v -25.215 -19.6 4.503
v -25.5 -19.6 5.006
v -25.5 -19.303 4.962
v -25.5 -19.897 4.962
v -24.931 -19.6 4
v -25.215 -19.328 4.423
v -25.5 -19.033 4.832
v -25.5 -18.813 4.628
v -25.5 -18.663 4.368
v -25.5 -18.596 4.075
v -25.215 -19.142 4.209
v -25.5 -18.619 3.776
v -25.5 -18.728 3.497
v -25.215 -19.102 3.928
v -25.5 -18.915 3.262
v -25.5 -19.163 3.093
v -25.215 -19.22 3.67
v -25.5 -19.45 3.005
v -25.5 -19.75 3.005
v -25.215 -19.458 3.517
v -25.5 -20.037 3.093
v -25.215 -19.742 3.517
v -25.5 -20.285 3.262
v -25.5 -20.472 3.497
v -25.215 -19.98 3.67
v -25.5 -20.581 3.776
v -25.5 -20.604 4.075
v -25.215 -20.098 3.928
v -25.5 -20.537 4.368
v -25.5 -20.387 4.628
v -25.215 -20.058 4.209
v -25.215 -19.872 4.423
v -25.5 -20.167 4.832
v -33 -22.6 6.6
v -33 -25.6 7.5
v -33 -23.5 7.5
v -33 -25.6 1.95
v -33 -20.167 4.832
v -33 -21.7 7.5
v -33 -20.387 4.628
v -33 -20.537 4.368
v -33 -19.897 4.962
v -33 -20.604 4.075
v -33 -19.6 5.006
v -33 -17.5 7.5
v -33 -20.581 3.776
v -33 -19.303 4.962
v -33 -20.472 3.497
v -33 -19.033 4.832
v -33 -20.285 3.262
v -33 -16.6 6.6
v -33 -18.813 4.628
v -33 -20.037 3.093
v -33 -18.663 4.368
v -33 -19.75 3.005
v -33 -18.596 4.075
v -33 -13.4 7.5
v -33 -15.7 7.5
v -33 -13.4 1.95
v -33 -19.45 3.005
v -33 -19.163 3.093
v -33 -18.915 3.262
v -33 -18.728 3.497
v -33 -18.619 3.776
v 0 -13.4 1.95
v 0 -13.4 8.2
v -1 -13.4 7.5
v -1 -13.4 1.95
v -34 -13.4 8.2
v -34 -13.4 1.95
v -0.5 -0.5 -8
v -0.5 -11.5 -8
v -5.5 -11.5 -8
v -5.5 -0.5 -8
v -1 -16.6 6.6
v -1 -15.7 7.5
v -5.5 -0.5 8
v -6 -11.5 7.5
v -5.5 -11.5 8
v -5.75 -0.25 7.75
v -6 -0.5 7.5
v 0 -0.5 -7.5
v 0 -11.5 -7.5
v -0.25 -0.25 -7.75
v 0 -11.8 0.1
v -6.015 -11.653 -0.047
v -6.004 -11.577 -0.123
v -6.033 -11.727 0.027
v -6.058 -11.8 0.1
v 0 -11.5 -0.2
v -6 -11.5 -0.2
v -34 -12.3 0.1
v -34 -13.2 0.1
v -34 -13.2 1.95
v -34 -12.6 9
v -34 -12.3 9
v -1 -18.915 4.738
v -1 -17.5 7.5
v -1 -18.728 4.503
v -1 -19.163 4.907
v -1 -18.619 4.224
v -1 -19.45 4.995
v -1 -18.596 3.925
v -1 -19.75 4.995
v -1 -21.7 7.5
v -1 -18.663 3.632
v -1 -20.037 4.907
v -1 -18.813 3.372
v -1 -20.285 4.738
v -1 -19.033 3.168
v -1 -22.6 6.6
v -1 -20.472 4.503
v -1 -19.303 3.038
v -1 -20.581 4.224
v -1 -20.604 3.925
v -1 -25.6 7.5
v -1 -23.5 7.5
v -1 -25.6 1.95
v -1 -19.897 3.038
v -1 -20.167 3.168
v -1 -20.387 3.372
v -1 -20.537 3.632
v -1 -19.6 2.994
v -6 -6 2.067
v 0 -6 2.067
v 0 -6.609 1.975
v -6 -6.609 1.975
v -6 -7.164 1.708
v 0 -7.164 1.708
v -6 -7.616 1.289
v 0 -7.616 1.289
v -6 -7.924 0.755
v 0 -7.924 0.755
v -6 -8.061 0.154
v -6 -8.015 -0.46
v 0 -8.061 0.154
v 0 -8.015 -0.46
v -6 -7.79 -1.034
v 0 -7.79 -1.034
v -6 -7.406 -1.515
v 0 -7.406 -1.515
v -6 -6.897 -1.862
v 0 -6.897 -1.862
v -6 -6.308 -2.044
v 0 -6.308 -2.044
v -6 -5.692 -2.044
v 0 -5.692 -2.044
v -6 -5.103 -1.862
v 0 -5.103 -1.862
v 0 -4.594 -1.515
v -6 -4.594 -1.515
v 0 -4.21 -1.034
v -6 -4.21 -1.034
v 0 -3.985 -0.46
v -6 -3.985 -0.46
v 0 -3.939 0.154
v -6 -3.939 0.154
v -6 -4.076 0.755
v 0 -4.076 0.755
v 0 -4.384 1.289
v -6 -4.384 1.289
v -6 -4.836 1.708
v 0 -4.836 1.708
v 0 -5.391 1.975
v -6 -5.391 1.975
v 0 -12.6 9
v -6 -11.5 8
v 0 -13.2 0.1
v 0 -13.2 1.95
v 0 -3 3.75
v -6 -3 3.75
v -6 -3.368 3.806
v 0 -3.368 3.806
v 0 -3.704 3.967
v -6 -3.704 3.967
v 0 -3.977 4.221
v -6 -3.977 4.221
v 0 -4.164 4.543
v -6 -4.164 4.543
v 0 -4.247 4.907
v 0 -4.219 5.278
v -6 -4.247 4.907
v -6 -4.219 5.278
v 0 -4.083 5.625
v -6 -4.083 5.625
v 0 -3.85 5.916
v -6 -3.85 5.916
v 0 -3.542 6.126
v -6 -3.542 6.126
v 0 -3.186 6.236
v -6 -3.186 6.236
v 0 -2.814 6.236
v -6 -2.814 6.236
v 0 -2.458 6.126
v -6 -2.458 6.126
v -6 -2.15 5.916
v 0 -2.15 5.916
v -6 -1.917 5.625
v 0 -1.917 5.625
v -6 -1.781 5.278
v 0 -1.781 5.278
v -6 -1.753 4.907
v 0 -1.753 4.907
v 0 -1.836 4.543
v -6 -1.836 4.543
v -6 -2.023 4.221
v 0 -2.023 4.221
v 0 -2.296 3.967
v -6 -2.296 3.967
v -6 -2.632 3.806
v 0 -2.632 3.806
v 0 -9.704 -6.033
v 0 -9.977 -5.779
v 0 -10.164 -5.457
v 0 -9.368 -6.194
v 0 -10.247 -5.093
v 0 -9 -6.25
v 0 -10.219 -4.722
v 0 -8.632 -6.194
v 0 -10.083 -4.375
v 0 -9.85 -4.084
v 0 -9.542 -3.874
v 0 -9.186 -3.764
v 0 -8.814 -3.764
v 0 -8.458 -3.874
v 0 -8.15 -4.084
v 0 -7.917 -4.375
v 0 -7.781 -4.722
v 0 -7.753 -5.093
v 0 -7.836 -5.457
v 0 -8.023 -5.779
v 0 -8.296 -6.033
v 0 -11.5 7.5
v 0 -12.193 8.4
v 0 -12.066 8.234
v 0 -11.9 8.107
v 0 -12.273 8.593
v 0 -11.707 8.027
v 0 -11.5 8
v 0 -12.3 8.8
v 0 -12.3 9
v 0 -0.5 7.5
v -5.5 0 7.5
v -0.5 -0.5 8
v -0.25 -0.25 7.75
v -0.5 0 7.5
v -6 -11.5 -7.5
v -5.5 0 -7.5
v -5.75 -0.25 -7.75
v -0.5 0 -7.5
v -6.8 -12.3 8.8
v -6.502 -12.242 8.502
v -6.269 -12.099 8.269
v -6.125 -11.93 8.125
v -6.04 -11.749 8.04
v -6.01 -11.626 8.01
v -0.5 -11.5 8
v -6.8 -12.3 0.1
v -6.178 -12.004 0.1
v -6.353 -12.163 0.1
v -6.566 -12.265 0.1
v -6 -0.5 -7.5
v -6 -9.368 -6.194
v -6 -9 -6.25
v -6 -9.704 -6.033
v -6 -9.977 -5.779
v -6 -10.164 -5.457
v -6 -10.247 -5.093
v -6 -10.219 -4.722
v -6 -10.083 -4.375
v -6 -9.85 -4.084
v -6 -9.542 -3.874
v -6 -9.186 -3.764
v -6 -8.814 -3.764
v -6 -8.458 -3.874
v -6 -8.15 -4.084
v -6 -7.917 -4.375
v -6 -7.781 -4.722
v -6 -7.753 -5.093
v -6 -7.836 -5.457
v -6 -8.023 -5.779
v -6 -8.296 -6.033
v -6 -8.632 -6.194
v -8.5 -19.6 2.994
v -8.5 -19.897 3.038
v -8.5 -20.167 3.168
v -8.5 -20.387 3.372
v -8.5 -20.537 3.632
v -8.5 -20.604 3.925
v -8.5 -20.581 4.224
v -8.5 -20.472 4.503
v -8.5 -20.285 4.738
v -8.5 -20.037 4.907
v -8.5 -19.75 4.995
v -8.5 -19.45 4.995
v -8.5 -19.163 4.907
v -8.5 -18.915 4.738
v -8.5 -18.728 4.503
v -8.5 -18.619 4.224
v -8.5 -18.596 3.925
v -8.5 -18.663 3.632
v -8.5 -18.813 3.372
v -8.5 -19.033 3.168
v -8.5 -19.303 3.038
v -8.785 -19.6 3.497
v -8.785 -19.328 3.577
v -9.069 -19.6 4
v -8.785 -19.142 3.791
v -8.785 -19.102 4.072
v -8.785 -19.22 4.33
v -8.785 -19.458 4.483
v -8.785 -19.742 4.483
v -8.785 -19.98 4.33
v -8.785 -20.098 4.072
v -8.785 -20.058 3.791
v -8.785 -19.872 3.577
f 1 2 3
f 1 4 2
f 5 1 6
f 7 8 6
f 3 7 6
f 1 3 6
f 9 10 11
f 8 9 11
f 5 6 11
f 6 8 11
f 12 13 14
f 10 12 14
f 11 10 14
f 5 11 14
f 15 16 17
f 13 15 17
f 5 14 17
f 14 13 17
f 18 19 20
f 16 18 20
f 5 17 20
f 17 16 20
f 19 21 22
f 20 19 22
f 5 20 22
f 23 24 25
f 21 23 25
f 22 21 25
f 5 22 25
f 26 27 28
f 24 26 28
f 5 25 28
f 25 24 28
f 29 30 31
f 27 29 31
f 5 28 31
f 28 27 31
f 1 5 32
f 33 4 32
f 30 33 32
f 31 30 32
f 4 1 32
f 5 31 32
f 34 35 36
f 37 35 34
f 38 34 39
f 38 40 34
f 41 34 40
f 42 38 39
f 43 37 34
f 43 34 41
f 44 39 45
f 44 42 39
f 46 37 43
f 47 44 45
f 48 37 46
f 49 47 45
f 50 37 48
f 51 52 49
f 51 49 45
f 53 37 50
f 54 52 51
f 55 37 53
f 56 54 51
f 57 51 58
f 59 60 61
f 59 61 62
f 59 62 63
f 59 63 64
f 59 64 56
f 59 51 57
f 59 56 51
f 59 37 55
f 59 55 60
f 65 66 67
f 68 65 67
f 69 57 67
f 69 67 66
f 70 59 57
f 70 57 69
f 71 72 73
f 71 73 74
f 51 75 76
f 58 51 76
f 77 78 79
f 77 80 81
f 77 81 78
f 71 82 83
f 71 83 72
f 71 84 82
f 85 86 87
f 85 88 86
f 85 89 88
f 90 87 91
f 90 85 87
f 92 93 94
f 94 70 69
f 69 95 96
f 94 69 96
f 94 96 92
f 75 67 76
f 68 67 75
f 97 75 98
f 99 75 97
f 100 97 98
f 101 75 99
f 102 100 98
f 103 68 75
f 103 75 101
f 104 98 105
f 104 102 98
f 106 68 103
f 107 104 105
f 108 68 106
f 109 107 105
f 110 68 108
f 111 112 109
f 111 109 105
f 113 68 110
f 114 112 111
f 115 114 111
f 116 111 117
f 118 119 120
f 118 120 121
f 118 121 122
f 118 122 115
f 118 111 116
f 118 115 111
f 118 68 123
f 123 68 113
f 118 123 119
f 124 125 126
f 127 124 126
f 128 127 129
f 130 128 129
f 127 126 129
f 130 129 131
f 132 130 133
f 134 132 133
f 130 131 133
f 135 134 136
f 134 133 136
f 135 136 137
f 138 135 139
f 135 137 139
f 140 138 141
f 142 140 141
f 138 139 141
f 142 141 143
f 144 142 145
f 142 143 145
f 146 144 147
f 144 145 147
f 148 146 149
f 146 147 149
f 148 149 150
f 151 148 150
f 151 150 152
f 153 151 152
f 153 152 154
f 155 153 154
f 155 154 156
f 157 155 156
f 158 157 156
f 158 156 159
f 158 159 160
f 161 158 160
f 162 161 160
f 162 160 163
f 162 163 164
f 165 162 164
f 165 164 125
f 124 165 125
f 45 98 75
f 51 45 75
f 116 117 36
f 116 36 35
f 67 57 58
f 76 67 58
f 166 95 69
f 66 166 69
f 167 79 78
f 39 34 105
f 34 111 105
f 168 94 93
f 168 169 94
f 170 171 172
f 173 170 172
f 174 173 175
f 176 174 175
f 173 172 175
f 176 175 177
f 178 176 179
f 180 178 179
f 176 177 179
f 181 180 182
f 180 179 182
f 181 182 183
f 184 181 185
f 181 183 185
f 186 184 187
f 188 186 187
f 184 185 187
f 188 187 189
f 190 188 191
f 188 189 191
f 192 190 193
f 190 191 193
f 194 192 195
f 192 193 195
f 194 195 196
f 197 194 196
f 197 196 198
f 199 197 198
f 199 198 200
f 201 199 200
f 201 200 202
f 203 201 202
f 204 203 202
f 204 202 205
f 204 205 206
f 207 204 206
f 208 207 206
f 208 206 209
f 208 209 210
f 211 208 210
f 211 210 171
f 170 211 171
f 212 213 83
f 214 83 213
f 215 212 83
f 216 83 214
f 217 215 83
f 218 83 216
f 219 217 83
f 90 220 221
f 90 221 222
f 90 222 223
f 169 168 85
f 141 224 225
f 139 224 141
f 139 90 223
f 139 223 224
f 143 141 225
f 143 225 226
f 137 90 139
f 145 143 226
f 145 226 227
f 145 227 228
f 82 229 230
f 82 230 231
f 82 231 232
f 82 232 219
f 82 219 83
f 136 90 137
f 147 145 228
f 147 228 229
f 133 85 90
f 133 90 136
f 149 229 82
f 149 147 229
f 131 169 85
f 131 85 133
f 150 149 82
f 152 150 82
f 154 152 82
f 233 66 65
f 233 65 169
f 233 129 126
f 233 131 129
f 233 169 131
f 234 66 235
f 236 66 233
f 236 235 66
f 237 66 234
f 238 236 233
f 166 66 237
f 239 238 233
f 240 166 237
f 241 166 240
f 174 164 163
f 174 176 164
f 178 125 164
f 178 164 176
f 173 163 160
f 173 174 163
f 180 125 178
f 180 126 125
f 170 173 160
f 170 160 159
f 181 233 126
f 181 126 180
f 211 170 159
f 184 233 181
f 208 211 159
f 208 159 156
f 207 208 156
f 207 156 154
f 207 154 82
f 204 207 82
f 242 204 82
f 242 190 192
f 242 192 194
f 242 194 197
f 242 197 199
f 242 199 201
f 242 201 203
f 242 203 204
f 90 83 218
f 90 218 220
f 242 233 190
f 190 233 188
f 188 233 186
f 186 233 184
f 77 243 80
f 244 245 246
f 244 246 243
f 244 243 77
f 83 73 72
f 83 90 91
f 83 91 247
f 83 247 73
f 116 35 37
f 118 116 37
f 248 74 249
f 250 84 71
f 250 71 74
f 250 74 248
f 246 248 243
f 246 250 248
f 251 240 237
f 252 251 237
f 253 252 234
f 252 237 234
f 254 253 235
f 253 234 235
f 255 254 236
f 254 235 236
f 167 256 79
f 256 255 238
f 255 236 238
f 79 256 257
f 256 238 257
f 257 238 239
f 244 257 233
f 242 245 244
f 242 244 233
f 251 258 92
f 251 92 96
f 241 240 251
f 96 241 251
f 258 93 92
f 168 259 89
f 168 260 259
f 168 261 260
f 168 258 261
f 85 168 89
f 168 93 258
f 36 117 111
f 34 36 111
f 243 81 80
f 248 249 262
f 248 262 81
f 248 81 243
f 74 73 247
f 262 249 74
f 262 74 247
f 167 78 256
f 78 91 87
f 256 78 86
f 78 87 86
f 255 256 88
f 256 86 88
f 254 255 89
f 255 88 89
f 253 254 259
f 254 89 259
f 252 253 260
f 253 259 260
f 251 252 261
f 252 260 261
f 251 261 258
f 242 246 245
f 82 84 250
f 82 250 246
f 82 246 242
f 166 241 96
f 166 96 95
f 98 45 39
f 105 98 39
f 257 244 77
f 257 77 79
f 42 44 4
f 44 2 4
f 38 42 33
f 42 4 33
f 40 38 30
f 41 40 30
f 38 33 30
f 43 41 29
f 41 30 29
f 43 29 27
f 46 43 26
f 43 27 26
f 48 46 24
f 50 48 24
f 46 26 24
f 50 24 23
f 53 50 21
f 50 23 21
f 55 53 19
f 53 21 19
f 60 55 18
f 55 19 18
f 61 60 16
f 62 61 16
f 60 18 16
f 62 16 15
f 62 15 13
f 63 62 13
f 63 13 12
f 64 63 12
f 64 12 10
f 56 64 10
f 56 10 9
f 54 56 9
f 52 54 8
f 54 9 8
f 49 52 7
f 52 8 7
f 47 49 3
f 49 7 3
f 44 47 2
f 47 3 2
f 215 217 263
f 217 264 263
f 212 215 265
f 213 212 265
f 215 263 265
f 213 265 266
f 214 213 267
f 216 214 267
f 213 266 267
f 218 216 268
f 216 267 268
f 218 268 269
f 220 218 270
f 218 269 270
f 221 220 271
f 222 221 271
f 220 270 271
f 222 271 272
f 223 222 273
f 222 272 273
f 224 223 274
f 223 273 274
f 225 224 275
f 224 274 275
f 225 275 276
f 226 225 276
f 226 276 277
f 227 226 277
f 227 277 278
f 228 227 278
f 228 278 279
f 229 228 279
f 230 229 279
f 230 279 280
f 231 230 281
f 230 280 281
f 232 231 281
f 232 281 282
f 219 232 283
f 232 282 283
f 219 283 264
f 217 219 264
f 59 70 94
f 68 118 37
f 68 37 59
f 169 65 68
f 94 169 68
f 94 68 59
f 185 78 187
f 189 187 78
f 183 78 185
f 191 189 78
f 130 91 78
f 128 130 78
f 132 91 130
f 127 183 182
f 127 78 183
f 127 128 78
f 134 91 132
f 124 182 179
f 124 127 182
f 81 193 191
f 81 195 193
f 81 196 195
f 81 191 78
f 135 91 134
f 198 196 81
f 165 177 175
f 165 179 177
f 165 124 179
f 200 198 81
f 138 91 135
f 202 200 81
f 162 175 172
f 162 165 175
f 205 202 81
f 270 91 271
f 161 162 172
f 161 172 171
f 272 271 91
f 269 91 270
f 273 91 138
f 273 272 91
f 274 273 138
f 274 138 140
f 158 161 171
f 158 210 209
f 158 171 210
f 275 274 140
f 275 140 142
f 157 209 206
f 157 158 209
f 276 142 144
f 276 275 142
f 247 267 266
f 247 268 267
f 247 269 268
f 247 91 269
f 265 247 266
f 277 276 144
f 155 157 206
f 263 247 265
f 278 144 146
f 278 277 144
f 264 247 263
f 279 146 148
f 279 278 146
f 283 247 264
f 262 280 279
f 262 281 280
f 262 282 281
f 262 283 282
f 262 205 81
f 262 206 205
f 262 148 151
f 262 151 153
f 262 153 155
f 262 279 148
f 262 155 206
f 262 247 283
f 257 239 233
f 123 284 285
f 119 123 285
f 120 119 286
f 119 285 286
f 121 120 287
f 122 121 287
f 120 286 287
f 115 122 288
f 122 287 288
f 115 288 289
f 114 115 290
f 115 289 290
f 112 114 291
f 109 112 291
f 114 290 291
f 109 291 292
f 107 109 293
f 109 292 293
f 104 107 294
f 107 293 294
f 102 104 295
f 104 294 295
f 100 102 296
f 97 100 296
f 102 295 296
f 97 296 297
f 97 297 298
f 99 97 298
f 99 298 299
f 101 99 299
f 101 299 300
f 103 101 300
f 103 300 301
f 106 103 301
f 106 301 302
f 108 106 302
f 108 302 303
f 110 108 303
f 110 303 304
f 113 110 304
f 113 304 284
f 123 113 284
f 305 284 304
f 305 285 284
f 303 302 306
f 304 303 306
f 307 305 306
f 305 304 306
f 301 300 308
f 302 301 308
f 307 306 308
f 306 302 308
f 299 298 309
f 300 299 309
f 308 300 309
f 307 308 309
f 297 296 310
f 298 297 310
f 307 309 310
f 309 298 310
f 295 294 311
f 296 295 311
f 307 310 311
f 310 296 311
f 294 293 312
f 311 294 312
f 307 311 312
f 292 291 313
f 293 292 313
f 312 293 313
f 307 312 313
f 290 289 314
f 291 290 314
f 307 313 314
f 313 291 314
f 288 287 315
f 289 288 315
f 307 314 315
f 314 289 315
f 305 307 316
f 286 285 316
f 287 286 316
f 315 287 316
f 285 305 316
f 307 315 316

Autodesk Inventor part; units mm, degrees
sketch "Sketch_1" plane through (0, 0, 0) normal (1, 0, 0) x (0, 1, 0)
  line L0 (-12.3, 9) -> (-12.6, 9)
  line L1 (-12.6, 9) -> (-13.4, 8.2)
  line L2 (-13.4, 8.2) -> (-13.4, 7.5)
  line L3 (-13.4, 7.5) -> (-25.6, 7.5)
  line L4 (-25.6, 7.5) -> (-25.6, 1.95)
  line L5 (-25.6, 1.95) -> (-13.2, 1.95)
  line L6 (-13.2, 1.95) -> (-13.2, 0.1)
  line L7 (-13.2, 0.1) -> (-11.8, 0.1)
  line L8 (-11.8, 0.1) -> (-11.5, -0.2)
  line L9 (-11.5, -0.2) -> (-11.5, -8)
  line L10 (-11.5, -8) -> (-0.5, -8)
  line L11 (-0.5, -8) -> (0, -7.5)
  line L12 (0, -7.5) -> (0, 7.5)
  line L13 (0, 7.5) -> (-0.5, 8)
  line L14 (-0.5, 8) -> (-11.5, 8)
  arc A0 (-12.3, 8.8) -> (-11.5, 8) centre (-11.5, 8.8) ccw
  line L15 (-12.3, 8.8) -> (-12.3, 9)
extrude "Extrusion1" add sketch "Sketch_1" against normal blind 34
sketch "Sketch_2" plane through (0, 0, 0) normal (0, 0, 1) x (1, 0, 0)
  line L0 (-35, 1) -> (-35, -26.6)
  line L1 (-35, -26.6) -> (0, -26.6)
  line L2 (0, -26.6) -> (0, -13.4)
  line L3 (0, -13.4) -> (-1, -13.4)
  line L4 (-1, -13.4) -> (-1, -25.6)
  line L5 (-1, -25.6) -> (-33, -25.6)
  line L6 (-33, -25.6) -> (-33, -13.4)
  line L7 (-33, -13.4) -> (-34, -13.4)
  line L8 (-34, -13.4) -> (-34, -12.3)
  line L9 (-34, -12.3) -> (-6.8, -12.3)
  arc A0 (-6.8, -12.3) -> (-6, -11.5) centre (-6.8, -11.5) ccw
  line L10 (-6, -11.5) -> (-6, -0.5)
  line L11 (-6, -0.5) -> (-5.5, 0)
  line L12 (-5.5, 0) -> (-0.5, 0)
  line L13 (-0.5, 0) -> (0, -0.5)
  line L14 (0, -0.5) -> (0, 1)
  line L15 (0, 1) -> (-35, 1)
extrude "Extrusion2" cut sketch "Sketch_2" along normal mid plane 68
sketch "Sketch_3" plane through (0, 0, 0) normal (0, 1, 0) x (-1, 0, 0)
  circle A0 centre (0, 0) radius 34
  line L0 (6, -7.5) -> (6, 7.5)
  line L1 (6, 7.5) -> (5.5, 8)
  line L2 (5.5, 8) -> (0.5, 8)
  line L3 (0.5, 8) -> (0, 7.5)
  line L4 (0, 7.5) -> (0, -7.5)
  line L5 (0, -7.5) -> (0.5, -8)
  line L6 (0.5, -8) -> (5.5, -8)
  line L7 (5.5, -8) -> (6, -7.5)
extrude "Extrusion3" cut sketch "Sketch_3" against normal blind 11.5
sketch "Sketch_4" plane through (0, 0, 0) normal (1, 0, 0) x (0, 1, 0)
  line L0 (-14.7, 8.5) -> (-24.5, 8.5)
  line L1 (-24.5, 8.5) -> (-22.6, 6.6)
  line L2 (-22.6, 6.6) -> (-21.7, 7.5)
  line L3 (-21.7, 7.5) -> (-17.5, 7.5)
  line L4 (-17.5, 7.5) -> (-16.6, 6.6)
  line L5 (-16.6, 6.6) -> (-14.7, 8.5)
extrude "Extrusion4" cut sketch "Sketch_4" against normal blind 34
sketch "Sketch5" plane through (-6, -11.5, 7.5) normal (-1, 0, 0) x (0, 0, 1)
  point P0 (-7.5, 5.5)
hole "Hole1" at (-6, -6, 0) direction (1, 0, 0) diameter 4.134 depth 6 thread size "M5x0.8" class "6H" standard "ISO Metric profile"
sketch "Sketch6" plane through (0, 0, 0) normal (1, 0, 0) x (0, 0, -1)
  point P0 (-5, -3)
hole "Hole2" at (0, -3, 5) direction (-1, 0, 0) diameter 2.5 depth 6
pattern_linear "Rectangular Pattern1" count 2 spacing 11.6619 along (0, -0.5145, -0.8575) of "Hole2"
sketch "Sketch7" plane through (-1, -25.6, 1.95) normal (1, 0, 0) x (0, 0, -1)
  point P0 (-2.05, 6)
hole "Hole3" at (-1, -19.6, 4) direction (-1, 0, 0) diameter 2.013 depth 7.5 tip angle 121 thread size "M2.5x0.45" class "6H" standard "ISO Metric profile"
sketch "Sketch8" plane through (-33, -25.6, 1.95) normal (-1, 0, 0) x (0, 0, 1)
  point P0 (2.05, 6)
hole "Hole4" at (-33, -19.6, 4) direction (1, 0, 0) diameter 2.013 depth 7.5 tip angle 121 thread size "M2.5x0.45" class "6H" standard "ISO Metric profile"
ref_plane "HUB_XY" through (-6, 0, 0) normal (1, 0, 0) x (0, 0, -1)
ref_plane "HUB_YZ" through (-6, 0, 0) normal (0, 0, -1) x (0, 1, 0)
ref_plane "HUB_ZX" through (-6, 0, 0) normal (0, 1, 0) x (1, 0, 0)
ref_plane "hal_1_XY" through (-1, -19.6, 4) normal (1, 0, 0) x (0, 0, -1)
ref_plane "hal_1_YZ" through (-1, -19.6, 4) normal (0, 0, -1) x (0, 1, 0)
ref_plane "hal_1_ZX" through (-1, -19.6, 4) normal (0, 1, 0) x (1, 0, 0)
ref_plane "hal_2_XY" through (-33, -19.6, 4) normal (1, 0, 0) x (0, 0, -1)
ref_plane "hal_2_YZ" through (-33, -19.6, 4) normal (0, 0, -1) x (0, 1, 0)
ref_plane "hal_2_ZX" through (-33, -19.6, 4) normal (0, 1, 0) x (1, 0, 0)
properties part number "SCHUNK-5521119 Finger EGP 40"
